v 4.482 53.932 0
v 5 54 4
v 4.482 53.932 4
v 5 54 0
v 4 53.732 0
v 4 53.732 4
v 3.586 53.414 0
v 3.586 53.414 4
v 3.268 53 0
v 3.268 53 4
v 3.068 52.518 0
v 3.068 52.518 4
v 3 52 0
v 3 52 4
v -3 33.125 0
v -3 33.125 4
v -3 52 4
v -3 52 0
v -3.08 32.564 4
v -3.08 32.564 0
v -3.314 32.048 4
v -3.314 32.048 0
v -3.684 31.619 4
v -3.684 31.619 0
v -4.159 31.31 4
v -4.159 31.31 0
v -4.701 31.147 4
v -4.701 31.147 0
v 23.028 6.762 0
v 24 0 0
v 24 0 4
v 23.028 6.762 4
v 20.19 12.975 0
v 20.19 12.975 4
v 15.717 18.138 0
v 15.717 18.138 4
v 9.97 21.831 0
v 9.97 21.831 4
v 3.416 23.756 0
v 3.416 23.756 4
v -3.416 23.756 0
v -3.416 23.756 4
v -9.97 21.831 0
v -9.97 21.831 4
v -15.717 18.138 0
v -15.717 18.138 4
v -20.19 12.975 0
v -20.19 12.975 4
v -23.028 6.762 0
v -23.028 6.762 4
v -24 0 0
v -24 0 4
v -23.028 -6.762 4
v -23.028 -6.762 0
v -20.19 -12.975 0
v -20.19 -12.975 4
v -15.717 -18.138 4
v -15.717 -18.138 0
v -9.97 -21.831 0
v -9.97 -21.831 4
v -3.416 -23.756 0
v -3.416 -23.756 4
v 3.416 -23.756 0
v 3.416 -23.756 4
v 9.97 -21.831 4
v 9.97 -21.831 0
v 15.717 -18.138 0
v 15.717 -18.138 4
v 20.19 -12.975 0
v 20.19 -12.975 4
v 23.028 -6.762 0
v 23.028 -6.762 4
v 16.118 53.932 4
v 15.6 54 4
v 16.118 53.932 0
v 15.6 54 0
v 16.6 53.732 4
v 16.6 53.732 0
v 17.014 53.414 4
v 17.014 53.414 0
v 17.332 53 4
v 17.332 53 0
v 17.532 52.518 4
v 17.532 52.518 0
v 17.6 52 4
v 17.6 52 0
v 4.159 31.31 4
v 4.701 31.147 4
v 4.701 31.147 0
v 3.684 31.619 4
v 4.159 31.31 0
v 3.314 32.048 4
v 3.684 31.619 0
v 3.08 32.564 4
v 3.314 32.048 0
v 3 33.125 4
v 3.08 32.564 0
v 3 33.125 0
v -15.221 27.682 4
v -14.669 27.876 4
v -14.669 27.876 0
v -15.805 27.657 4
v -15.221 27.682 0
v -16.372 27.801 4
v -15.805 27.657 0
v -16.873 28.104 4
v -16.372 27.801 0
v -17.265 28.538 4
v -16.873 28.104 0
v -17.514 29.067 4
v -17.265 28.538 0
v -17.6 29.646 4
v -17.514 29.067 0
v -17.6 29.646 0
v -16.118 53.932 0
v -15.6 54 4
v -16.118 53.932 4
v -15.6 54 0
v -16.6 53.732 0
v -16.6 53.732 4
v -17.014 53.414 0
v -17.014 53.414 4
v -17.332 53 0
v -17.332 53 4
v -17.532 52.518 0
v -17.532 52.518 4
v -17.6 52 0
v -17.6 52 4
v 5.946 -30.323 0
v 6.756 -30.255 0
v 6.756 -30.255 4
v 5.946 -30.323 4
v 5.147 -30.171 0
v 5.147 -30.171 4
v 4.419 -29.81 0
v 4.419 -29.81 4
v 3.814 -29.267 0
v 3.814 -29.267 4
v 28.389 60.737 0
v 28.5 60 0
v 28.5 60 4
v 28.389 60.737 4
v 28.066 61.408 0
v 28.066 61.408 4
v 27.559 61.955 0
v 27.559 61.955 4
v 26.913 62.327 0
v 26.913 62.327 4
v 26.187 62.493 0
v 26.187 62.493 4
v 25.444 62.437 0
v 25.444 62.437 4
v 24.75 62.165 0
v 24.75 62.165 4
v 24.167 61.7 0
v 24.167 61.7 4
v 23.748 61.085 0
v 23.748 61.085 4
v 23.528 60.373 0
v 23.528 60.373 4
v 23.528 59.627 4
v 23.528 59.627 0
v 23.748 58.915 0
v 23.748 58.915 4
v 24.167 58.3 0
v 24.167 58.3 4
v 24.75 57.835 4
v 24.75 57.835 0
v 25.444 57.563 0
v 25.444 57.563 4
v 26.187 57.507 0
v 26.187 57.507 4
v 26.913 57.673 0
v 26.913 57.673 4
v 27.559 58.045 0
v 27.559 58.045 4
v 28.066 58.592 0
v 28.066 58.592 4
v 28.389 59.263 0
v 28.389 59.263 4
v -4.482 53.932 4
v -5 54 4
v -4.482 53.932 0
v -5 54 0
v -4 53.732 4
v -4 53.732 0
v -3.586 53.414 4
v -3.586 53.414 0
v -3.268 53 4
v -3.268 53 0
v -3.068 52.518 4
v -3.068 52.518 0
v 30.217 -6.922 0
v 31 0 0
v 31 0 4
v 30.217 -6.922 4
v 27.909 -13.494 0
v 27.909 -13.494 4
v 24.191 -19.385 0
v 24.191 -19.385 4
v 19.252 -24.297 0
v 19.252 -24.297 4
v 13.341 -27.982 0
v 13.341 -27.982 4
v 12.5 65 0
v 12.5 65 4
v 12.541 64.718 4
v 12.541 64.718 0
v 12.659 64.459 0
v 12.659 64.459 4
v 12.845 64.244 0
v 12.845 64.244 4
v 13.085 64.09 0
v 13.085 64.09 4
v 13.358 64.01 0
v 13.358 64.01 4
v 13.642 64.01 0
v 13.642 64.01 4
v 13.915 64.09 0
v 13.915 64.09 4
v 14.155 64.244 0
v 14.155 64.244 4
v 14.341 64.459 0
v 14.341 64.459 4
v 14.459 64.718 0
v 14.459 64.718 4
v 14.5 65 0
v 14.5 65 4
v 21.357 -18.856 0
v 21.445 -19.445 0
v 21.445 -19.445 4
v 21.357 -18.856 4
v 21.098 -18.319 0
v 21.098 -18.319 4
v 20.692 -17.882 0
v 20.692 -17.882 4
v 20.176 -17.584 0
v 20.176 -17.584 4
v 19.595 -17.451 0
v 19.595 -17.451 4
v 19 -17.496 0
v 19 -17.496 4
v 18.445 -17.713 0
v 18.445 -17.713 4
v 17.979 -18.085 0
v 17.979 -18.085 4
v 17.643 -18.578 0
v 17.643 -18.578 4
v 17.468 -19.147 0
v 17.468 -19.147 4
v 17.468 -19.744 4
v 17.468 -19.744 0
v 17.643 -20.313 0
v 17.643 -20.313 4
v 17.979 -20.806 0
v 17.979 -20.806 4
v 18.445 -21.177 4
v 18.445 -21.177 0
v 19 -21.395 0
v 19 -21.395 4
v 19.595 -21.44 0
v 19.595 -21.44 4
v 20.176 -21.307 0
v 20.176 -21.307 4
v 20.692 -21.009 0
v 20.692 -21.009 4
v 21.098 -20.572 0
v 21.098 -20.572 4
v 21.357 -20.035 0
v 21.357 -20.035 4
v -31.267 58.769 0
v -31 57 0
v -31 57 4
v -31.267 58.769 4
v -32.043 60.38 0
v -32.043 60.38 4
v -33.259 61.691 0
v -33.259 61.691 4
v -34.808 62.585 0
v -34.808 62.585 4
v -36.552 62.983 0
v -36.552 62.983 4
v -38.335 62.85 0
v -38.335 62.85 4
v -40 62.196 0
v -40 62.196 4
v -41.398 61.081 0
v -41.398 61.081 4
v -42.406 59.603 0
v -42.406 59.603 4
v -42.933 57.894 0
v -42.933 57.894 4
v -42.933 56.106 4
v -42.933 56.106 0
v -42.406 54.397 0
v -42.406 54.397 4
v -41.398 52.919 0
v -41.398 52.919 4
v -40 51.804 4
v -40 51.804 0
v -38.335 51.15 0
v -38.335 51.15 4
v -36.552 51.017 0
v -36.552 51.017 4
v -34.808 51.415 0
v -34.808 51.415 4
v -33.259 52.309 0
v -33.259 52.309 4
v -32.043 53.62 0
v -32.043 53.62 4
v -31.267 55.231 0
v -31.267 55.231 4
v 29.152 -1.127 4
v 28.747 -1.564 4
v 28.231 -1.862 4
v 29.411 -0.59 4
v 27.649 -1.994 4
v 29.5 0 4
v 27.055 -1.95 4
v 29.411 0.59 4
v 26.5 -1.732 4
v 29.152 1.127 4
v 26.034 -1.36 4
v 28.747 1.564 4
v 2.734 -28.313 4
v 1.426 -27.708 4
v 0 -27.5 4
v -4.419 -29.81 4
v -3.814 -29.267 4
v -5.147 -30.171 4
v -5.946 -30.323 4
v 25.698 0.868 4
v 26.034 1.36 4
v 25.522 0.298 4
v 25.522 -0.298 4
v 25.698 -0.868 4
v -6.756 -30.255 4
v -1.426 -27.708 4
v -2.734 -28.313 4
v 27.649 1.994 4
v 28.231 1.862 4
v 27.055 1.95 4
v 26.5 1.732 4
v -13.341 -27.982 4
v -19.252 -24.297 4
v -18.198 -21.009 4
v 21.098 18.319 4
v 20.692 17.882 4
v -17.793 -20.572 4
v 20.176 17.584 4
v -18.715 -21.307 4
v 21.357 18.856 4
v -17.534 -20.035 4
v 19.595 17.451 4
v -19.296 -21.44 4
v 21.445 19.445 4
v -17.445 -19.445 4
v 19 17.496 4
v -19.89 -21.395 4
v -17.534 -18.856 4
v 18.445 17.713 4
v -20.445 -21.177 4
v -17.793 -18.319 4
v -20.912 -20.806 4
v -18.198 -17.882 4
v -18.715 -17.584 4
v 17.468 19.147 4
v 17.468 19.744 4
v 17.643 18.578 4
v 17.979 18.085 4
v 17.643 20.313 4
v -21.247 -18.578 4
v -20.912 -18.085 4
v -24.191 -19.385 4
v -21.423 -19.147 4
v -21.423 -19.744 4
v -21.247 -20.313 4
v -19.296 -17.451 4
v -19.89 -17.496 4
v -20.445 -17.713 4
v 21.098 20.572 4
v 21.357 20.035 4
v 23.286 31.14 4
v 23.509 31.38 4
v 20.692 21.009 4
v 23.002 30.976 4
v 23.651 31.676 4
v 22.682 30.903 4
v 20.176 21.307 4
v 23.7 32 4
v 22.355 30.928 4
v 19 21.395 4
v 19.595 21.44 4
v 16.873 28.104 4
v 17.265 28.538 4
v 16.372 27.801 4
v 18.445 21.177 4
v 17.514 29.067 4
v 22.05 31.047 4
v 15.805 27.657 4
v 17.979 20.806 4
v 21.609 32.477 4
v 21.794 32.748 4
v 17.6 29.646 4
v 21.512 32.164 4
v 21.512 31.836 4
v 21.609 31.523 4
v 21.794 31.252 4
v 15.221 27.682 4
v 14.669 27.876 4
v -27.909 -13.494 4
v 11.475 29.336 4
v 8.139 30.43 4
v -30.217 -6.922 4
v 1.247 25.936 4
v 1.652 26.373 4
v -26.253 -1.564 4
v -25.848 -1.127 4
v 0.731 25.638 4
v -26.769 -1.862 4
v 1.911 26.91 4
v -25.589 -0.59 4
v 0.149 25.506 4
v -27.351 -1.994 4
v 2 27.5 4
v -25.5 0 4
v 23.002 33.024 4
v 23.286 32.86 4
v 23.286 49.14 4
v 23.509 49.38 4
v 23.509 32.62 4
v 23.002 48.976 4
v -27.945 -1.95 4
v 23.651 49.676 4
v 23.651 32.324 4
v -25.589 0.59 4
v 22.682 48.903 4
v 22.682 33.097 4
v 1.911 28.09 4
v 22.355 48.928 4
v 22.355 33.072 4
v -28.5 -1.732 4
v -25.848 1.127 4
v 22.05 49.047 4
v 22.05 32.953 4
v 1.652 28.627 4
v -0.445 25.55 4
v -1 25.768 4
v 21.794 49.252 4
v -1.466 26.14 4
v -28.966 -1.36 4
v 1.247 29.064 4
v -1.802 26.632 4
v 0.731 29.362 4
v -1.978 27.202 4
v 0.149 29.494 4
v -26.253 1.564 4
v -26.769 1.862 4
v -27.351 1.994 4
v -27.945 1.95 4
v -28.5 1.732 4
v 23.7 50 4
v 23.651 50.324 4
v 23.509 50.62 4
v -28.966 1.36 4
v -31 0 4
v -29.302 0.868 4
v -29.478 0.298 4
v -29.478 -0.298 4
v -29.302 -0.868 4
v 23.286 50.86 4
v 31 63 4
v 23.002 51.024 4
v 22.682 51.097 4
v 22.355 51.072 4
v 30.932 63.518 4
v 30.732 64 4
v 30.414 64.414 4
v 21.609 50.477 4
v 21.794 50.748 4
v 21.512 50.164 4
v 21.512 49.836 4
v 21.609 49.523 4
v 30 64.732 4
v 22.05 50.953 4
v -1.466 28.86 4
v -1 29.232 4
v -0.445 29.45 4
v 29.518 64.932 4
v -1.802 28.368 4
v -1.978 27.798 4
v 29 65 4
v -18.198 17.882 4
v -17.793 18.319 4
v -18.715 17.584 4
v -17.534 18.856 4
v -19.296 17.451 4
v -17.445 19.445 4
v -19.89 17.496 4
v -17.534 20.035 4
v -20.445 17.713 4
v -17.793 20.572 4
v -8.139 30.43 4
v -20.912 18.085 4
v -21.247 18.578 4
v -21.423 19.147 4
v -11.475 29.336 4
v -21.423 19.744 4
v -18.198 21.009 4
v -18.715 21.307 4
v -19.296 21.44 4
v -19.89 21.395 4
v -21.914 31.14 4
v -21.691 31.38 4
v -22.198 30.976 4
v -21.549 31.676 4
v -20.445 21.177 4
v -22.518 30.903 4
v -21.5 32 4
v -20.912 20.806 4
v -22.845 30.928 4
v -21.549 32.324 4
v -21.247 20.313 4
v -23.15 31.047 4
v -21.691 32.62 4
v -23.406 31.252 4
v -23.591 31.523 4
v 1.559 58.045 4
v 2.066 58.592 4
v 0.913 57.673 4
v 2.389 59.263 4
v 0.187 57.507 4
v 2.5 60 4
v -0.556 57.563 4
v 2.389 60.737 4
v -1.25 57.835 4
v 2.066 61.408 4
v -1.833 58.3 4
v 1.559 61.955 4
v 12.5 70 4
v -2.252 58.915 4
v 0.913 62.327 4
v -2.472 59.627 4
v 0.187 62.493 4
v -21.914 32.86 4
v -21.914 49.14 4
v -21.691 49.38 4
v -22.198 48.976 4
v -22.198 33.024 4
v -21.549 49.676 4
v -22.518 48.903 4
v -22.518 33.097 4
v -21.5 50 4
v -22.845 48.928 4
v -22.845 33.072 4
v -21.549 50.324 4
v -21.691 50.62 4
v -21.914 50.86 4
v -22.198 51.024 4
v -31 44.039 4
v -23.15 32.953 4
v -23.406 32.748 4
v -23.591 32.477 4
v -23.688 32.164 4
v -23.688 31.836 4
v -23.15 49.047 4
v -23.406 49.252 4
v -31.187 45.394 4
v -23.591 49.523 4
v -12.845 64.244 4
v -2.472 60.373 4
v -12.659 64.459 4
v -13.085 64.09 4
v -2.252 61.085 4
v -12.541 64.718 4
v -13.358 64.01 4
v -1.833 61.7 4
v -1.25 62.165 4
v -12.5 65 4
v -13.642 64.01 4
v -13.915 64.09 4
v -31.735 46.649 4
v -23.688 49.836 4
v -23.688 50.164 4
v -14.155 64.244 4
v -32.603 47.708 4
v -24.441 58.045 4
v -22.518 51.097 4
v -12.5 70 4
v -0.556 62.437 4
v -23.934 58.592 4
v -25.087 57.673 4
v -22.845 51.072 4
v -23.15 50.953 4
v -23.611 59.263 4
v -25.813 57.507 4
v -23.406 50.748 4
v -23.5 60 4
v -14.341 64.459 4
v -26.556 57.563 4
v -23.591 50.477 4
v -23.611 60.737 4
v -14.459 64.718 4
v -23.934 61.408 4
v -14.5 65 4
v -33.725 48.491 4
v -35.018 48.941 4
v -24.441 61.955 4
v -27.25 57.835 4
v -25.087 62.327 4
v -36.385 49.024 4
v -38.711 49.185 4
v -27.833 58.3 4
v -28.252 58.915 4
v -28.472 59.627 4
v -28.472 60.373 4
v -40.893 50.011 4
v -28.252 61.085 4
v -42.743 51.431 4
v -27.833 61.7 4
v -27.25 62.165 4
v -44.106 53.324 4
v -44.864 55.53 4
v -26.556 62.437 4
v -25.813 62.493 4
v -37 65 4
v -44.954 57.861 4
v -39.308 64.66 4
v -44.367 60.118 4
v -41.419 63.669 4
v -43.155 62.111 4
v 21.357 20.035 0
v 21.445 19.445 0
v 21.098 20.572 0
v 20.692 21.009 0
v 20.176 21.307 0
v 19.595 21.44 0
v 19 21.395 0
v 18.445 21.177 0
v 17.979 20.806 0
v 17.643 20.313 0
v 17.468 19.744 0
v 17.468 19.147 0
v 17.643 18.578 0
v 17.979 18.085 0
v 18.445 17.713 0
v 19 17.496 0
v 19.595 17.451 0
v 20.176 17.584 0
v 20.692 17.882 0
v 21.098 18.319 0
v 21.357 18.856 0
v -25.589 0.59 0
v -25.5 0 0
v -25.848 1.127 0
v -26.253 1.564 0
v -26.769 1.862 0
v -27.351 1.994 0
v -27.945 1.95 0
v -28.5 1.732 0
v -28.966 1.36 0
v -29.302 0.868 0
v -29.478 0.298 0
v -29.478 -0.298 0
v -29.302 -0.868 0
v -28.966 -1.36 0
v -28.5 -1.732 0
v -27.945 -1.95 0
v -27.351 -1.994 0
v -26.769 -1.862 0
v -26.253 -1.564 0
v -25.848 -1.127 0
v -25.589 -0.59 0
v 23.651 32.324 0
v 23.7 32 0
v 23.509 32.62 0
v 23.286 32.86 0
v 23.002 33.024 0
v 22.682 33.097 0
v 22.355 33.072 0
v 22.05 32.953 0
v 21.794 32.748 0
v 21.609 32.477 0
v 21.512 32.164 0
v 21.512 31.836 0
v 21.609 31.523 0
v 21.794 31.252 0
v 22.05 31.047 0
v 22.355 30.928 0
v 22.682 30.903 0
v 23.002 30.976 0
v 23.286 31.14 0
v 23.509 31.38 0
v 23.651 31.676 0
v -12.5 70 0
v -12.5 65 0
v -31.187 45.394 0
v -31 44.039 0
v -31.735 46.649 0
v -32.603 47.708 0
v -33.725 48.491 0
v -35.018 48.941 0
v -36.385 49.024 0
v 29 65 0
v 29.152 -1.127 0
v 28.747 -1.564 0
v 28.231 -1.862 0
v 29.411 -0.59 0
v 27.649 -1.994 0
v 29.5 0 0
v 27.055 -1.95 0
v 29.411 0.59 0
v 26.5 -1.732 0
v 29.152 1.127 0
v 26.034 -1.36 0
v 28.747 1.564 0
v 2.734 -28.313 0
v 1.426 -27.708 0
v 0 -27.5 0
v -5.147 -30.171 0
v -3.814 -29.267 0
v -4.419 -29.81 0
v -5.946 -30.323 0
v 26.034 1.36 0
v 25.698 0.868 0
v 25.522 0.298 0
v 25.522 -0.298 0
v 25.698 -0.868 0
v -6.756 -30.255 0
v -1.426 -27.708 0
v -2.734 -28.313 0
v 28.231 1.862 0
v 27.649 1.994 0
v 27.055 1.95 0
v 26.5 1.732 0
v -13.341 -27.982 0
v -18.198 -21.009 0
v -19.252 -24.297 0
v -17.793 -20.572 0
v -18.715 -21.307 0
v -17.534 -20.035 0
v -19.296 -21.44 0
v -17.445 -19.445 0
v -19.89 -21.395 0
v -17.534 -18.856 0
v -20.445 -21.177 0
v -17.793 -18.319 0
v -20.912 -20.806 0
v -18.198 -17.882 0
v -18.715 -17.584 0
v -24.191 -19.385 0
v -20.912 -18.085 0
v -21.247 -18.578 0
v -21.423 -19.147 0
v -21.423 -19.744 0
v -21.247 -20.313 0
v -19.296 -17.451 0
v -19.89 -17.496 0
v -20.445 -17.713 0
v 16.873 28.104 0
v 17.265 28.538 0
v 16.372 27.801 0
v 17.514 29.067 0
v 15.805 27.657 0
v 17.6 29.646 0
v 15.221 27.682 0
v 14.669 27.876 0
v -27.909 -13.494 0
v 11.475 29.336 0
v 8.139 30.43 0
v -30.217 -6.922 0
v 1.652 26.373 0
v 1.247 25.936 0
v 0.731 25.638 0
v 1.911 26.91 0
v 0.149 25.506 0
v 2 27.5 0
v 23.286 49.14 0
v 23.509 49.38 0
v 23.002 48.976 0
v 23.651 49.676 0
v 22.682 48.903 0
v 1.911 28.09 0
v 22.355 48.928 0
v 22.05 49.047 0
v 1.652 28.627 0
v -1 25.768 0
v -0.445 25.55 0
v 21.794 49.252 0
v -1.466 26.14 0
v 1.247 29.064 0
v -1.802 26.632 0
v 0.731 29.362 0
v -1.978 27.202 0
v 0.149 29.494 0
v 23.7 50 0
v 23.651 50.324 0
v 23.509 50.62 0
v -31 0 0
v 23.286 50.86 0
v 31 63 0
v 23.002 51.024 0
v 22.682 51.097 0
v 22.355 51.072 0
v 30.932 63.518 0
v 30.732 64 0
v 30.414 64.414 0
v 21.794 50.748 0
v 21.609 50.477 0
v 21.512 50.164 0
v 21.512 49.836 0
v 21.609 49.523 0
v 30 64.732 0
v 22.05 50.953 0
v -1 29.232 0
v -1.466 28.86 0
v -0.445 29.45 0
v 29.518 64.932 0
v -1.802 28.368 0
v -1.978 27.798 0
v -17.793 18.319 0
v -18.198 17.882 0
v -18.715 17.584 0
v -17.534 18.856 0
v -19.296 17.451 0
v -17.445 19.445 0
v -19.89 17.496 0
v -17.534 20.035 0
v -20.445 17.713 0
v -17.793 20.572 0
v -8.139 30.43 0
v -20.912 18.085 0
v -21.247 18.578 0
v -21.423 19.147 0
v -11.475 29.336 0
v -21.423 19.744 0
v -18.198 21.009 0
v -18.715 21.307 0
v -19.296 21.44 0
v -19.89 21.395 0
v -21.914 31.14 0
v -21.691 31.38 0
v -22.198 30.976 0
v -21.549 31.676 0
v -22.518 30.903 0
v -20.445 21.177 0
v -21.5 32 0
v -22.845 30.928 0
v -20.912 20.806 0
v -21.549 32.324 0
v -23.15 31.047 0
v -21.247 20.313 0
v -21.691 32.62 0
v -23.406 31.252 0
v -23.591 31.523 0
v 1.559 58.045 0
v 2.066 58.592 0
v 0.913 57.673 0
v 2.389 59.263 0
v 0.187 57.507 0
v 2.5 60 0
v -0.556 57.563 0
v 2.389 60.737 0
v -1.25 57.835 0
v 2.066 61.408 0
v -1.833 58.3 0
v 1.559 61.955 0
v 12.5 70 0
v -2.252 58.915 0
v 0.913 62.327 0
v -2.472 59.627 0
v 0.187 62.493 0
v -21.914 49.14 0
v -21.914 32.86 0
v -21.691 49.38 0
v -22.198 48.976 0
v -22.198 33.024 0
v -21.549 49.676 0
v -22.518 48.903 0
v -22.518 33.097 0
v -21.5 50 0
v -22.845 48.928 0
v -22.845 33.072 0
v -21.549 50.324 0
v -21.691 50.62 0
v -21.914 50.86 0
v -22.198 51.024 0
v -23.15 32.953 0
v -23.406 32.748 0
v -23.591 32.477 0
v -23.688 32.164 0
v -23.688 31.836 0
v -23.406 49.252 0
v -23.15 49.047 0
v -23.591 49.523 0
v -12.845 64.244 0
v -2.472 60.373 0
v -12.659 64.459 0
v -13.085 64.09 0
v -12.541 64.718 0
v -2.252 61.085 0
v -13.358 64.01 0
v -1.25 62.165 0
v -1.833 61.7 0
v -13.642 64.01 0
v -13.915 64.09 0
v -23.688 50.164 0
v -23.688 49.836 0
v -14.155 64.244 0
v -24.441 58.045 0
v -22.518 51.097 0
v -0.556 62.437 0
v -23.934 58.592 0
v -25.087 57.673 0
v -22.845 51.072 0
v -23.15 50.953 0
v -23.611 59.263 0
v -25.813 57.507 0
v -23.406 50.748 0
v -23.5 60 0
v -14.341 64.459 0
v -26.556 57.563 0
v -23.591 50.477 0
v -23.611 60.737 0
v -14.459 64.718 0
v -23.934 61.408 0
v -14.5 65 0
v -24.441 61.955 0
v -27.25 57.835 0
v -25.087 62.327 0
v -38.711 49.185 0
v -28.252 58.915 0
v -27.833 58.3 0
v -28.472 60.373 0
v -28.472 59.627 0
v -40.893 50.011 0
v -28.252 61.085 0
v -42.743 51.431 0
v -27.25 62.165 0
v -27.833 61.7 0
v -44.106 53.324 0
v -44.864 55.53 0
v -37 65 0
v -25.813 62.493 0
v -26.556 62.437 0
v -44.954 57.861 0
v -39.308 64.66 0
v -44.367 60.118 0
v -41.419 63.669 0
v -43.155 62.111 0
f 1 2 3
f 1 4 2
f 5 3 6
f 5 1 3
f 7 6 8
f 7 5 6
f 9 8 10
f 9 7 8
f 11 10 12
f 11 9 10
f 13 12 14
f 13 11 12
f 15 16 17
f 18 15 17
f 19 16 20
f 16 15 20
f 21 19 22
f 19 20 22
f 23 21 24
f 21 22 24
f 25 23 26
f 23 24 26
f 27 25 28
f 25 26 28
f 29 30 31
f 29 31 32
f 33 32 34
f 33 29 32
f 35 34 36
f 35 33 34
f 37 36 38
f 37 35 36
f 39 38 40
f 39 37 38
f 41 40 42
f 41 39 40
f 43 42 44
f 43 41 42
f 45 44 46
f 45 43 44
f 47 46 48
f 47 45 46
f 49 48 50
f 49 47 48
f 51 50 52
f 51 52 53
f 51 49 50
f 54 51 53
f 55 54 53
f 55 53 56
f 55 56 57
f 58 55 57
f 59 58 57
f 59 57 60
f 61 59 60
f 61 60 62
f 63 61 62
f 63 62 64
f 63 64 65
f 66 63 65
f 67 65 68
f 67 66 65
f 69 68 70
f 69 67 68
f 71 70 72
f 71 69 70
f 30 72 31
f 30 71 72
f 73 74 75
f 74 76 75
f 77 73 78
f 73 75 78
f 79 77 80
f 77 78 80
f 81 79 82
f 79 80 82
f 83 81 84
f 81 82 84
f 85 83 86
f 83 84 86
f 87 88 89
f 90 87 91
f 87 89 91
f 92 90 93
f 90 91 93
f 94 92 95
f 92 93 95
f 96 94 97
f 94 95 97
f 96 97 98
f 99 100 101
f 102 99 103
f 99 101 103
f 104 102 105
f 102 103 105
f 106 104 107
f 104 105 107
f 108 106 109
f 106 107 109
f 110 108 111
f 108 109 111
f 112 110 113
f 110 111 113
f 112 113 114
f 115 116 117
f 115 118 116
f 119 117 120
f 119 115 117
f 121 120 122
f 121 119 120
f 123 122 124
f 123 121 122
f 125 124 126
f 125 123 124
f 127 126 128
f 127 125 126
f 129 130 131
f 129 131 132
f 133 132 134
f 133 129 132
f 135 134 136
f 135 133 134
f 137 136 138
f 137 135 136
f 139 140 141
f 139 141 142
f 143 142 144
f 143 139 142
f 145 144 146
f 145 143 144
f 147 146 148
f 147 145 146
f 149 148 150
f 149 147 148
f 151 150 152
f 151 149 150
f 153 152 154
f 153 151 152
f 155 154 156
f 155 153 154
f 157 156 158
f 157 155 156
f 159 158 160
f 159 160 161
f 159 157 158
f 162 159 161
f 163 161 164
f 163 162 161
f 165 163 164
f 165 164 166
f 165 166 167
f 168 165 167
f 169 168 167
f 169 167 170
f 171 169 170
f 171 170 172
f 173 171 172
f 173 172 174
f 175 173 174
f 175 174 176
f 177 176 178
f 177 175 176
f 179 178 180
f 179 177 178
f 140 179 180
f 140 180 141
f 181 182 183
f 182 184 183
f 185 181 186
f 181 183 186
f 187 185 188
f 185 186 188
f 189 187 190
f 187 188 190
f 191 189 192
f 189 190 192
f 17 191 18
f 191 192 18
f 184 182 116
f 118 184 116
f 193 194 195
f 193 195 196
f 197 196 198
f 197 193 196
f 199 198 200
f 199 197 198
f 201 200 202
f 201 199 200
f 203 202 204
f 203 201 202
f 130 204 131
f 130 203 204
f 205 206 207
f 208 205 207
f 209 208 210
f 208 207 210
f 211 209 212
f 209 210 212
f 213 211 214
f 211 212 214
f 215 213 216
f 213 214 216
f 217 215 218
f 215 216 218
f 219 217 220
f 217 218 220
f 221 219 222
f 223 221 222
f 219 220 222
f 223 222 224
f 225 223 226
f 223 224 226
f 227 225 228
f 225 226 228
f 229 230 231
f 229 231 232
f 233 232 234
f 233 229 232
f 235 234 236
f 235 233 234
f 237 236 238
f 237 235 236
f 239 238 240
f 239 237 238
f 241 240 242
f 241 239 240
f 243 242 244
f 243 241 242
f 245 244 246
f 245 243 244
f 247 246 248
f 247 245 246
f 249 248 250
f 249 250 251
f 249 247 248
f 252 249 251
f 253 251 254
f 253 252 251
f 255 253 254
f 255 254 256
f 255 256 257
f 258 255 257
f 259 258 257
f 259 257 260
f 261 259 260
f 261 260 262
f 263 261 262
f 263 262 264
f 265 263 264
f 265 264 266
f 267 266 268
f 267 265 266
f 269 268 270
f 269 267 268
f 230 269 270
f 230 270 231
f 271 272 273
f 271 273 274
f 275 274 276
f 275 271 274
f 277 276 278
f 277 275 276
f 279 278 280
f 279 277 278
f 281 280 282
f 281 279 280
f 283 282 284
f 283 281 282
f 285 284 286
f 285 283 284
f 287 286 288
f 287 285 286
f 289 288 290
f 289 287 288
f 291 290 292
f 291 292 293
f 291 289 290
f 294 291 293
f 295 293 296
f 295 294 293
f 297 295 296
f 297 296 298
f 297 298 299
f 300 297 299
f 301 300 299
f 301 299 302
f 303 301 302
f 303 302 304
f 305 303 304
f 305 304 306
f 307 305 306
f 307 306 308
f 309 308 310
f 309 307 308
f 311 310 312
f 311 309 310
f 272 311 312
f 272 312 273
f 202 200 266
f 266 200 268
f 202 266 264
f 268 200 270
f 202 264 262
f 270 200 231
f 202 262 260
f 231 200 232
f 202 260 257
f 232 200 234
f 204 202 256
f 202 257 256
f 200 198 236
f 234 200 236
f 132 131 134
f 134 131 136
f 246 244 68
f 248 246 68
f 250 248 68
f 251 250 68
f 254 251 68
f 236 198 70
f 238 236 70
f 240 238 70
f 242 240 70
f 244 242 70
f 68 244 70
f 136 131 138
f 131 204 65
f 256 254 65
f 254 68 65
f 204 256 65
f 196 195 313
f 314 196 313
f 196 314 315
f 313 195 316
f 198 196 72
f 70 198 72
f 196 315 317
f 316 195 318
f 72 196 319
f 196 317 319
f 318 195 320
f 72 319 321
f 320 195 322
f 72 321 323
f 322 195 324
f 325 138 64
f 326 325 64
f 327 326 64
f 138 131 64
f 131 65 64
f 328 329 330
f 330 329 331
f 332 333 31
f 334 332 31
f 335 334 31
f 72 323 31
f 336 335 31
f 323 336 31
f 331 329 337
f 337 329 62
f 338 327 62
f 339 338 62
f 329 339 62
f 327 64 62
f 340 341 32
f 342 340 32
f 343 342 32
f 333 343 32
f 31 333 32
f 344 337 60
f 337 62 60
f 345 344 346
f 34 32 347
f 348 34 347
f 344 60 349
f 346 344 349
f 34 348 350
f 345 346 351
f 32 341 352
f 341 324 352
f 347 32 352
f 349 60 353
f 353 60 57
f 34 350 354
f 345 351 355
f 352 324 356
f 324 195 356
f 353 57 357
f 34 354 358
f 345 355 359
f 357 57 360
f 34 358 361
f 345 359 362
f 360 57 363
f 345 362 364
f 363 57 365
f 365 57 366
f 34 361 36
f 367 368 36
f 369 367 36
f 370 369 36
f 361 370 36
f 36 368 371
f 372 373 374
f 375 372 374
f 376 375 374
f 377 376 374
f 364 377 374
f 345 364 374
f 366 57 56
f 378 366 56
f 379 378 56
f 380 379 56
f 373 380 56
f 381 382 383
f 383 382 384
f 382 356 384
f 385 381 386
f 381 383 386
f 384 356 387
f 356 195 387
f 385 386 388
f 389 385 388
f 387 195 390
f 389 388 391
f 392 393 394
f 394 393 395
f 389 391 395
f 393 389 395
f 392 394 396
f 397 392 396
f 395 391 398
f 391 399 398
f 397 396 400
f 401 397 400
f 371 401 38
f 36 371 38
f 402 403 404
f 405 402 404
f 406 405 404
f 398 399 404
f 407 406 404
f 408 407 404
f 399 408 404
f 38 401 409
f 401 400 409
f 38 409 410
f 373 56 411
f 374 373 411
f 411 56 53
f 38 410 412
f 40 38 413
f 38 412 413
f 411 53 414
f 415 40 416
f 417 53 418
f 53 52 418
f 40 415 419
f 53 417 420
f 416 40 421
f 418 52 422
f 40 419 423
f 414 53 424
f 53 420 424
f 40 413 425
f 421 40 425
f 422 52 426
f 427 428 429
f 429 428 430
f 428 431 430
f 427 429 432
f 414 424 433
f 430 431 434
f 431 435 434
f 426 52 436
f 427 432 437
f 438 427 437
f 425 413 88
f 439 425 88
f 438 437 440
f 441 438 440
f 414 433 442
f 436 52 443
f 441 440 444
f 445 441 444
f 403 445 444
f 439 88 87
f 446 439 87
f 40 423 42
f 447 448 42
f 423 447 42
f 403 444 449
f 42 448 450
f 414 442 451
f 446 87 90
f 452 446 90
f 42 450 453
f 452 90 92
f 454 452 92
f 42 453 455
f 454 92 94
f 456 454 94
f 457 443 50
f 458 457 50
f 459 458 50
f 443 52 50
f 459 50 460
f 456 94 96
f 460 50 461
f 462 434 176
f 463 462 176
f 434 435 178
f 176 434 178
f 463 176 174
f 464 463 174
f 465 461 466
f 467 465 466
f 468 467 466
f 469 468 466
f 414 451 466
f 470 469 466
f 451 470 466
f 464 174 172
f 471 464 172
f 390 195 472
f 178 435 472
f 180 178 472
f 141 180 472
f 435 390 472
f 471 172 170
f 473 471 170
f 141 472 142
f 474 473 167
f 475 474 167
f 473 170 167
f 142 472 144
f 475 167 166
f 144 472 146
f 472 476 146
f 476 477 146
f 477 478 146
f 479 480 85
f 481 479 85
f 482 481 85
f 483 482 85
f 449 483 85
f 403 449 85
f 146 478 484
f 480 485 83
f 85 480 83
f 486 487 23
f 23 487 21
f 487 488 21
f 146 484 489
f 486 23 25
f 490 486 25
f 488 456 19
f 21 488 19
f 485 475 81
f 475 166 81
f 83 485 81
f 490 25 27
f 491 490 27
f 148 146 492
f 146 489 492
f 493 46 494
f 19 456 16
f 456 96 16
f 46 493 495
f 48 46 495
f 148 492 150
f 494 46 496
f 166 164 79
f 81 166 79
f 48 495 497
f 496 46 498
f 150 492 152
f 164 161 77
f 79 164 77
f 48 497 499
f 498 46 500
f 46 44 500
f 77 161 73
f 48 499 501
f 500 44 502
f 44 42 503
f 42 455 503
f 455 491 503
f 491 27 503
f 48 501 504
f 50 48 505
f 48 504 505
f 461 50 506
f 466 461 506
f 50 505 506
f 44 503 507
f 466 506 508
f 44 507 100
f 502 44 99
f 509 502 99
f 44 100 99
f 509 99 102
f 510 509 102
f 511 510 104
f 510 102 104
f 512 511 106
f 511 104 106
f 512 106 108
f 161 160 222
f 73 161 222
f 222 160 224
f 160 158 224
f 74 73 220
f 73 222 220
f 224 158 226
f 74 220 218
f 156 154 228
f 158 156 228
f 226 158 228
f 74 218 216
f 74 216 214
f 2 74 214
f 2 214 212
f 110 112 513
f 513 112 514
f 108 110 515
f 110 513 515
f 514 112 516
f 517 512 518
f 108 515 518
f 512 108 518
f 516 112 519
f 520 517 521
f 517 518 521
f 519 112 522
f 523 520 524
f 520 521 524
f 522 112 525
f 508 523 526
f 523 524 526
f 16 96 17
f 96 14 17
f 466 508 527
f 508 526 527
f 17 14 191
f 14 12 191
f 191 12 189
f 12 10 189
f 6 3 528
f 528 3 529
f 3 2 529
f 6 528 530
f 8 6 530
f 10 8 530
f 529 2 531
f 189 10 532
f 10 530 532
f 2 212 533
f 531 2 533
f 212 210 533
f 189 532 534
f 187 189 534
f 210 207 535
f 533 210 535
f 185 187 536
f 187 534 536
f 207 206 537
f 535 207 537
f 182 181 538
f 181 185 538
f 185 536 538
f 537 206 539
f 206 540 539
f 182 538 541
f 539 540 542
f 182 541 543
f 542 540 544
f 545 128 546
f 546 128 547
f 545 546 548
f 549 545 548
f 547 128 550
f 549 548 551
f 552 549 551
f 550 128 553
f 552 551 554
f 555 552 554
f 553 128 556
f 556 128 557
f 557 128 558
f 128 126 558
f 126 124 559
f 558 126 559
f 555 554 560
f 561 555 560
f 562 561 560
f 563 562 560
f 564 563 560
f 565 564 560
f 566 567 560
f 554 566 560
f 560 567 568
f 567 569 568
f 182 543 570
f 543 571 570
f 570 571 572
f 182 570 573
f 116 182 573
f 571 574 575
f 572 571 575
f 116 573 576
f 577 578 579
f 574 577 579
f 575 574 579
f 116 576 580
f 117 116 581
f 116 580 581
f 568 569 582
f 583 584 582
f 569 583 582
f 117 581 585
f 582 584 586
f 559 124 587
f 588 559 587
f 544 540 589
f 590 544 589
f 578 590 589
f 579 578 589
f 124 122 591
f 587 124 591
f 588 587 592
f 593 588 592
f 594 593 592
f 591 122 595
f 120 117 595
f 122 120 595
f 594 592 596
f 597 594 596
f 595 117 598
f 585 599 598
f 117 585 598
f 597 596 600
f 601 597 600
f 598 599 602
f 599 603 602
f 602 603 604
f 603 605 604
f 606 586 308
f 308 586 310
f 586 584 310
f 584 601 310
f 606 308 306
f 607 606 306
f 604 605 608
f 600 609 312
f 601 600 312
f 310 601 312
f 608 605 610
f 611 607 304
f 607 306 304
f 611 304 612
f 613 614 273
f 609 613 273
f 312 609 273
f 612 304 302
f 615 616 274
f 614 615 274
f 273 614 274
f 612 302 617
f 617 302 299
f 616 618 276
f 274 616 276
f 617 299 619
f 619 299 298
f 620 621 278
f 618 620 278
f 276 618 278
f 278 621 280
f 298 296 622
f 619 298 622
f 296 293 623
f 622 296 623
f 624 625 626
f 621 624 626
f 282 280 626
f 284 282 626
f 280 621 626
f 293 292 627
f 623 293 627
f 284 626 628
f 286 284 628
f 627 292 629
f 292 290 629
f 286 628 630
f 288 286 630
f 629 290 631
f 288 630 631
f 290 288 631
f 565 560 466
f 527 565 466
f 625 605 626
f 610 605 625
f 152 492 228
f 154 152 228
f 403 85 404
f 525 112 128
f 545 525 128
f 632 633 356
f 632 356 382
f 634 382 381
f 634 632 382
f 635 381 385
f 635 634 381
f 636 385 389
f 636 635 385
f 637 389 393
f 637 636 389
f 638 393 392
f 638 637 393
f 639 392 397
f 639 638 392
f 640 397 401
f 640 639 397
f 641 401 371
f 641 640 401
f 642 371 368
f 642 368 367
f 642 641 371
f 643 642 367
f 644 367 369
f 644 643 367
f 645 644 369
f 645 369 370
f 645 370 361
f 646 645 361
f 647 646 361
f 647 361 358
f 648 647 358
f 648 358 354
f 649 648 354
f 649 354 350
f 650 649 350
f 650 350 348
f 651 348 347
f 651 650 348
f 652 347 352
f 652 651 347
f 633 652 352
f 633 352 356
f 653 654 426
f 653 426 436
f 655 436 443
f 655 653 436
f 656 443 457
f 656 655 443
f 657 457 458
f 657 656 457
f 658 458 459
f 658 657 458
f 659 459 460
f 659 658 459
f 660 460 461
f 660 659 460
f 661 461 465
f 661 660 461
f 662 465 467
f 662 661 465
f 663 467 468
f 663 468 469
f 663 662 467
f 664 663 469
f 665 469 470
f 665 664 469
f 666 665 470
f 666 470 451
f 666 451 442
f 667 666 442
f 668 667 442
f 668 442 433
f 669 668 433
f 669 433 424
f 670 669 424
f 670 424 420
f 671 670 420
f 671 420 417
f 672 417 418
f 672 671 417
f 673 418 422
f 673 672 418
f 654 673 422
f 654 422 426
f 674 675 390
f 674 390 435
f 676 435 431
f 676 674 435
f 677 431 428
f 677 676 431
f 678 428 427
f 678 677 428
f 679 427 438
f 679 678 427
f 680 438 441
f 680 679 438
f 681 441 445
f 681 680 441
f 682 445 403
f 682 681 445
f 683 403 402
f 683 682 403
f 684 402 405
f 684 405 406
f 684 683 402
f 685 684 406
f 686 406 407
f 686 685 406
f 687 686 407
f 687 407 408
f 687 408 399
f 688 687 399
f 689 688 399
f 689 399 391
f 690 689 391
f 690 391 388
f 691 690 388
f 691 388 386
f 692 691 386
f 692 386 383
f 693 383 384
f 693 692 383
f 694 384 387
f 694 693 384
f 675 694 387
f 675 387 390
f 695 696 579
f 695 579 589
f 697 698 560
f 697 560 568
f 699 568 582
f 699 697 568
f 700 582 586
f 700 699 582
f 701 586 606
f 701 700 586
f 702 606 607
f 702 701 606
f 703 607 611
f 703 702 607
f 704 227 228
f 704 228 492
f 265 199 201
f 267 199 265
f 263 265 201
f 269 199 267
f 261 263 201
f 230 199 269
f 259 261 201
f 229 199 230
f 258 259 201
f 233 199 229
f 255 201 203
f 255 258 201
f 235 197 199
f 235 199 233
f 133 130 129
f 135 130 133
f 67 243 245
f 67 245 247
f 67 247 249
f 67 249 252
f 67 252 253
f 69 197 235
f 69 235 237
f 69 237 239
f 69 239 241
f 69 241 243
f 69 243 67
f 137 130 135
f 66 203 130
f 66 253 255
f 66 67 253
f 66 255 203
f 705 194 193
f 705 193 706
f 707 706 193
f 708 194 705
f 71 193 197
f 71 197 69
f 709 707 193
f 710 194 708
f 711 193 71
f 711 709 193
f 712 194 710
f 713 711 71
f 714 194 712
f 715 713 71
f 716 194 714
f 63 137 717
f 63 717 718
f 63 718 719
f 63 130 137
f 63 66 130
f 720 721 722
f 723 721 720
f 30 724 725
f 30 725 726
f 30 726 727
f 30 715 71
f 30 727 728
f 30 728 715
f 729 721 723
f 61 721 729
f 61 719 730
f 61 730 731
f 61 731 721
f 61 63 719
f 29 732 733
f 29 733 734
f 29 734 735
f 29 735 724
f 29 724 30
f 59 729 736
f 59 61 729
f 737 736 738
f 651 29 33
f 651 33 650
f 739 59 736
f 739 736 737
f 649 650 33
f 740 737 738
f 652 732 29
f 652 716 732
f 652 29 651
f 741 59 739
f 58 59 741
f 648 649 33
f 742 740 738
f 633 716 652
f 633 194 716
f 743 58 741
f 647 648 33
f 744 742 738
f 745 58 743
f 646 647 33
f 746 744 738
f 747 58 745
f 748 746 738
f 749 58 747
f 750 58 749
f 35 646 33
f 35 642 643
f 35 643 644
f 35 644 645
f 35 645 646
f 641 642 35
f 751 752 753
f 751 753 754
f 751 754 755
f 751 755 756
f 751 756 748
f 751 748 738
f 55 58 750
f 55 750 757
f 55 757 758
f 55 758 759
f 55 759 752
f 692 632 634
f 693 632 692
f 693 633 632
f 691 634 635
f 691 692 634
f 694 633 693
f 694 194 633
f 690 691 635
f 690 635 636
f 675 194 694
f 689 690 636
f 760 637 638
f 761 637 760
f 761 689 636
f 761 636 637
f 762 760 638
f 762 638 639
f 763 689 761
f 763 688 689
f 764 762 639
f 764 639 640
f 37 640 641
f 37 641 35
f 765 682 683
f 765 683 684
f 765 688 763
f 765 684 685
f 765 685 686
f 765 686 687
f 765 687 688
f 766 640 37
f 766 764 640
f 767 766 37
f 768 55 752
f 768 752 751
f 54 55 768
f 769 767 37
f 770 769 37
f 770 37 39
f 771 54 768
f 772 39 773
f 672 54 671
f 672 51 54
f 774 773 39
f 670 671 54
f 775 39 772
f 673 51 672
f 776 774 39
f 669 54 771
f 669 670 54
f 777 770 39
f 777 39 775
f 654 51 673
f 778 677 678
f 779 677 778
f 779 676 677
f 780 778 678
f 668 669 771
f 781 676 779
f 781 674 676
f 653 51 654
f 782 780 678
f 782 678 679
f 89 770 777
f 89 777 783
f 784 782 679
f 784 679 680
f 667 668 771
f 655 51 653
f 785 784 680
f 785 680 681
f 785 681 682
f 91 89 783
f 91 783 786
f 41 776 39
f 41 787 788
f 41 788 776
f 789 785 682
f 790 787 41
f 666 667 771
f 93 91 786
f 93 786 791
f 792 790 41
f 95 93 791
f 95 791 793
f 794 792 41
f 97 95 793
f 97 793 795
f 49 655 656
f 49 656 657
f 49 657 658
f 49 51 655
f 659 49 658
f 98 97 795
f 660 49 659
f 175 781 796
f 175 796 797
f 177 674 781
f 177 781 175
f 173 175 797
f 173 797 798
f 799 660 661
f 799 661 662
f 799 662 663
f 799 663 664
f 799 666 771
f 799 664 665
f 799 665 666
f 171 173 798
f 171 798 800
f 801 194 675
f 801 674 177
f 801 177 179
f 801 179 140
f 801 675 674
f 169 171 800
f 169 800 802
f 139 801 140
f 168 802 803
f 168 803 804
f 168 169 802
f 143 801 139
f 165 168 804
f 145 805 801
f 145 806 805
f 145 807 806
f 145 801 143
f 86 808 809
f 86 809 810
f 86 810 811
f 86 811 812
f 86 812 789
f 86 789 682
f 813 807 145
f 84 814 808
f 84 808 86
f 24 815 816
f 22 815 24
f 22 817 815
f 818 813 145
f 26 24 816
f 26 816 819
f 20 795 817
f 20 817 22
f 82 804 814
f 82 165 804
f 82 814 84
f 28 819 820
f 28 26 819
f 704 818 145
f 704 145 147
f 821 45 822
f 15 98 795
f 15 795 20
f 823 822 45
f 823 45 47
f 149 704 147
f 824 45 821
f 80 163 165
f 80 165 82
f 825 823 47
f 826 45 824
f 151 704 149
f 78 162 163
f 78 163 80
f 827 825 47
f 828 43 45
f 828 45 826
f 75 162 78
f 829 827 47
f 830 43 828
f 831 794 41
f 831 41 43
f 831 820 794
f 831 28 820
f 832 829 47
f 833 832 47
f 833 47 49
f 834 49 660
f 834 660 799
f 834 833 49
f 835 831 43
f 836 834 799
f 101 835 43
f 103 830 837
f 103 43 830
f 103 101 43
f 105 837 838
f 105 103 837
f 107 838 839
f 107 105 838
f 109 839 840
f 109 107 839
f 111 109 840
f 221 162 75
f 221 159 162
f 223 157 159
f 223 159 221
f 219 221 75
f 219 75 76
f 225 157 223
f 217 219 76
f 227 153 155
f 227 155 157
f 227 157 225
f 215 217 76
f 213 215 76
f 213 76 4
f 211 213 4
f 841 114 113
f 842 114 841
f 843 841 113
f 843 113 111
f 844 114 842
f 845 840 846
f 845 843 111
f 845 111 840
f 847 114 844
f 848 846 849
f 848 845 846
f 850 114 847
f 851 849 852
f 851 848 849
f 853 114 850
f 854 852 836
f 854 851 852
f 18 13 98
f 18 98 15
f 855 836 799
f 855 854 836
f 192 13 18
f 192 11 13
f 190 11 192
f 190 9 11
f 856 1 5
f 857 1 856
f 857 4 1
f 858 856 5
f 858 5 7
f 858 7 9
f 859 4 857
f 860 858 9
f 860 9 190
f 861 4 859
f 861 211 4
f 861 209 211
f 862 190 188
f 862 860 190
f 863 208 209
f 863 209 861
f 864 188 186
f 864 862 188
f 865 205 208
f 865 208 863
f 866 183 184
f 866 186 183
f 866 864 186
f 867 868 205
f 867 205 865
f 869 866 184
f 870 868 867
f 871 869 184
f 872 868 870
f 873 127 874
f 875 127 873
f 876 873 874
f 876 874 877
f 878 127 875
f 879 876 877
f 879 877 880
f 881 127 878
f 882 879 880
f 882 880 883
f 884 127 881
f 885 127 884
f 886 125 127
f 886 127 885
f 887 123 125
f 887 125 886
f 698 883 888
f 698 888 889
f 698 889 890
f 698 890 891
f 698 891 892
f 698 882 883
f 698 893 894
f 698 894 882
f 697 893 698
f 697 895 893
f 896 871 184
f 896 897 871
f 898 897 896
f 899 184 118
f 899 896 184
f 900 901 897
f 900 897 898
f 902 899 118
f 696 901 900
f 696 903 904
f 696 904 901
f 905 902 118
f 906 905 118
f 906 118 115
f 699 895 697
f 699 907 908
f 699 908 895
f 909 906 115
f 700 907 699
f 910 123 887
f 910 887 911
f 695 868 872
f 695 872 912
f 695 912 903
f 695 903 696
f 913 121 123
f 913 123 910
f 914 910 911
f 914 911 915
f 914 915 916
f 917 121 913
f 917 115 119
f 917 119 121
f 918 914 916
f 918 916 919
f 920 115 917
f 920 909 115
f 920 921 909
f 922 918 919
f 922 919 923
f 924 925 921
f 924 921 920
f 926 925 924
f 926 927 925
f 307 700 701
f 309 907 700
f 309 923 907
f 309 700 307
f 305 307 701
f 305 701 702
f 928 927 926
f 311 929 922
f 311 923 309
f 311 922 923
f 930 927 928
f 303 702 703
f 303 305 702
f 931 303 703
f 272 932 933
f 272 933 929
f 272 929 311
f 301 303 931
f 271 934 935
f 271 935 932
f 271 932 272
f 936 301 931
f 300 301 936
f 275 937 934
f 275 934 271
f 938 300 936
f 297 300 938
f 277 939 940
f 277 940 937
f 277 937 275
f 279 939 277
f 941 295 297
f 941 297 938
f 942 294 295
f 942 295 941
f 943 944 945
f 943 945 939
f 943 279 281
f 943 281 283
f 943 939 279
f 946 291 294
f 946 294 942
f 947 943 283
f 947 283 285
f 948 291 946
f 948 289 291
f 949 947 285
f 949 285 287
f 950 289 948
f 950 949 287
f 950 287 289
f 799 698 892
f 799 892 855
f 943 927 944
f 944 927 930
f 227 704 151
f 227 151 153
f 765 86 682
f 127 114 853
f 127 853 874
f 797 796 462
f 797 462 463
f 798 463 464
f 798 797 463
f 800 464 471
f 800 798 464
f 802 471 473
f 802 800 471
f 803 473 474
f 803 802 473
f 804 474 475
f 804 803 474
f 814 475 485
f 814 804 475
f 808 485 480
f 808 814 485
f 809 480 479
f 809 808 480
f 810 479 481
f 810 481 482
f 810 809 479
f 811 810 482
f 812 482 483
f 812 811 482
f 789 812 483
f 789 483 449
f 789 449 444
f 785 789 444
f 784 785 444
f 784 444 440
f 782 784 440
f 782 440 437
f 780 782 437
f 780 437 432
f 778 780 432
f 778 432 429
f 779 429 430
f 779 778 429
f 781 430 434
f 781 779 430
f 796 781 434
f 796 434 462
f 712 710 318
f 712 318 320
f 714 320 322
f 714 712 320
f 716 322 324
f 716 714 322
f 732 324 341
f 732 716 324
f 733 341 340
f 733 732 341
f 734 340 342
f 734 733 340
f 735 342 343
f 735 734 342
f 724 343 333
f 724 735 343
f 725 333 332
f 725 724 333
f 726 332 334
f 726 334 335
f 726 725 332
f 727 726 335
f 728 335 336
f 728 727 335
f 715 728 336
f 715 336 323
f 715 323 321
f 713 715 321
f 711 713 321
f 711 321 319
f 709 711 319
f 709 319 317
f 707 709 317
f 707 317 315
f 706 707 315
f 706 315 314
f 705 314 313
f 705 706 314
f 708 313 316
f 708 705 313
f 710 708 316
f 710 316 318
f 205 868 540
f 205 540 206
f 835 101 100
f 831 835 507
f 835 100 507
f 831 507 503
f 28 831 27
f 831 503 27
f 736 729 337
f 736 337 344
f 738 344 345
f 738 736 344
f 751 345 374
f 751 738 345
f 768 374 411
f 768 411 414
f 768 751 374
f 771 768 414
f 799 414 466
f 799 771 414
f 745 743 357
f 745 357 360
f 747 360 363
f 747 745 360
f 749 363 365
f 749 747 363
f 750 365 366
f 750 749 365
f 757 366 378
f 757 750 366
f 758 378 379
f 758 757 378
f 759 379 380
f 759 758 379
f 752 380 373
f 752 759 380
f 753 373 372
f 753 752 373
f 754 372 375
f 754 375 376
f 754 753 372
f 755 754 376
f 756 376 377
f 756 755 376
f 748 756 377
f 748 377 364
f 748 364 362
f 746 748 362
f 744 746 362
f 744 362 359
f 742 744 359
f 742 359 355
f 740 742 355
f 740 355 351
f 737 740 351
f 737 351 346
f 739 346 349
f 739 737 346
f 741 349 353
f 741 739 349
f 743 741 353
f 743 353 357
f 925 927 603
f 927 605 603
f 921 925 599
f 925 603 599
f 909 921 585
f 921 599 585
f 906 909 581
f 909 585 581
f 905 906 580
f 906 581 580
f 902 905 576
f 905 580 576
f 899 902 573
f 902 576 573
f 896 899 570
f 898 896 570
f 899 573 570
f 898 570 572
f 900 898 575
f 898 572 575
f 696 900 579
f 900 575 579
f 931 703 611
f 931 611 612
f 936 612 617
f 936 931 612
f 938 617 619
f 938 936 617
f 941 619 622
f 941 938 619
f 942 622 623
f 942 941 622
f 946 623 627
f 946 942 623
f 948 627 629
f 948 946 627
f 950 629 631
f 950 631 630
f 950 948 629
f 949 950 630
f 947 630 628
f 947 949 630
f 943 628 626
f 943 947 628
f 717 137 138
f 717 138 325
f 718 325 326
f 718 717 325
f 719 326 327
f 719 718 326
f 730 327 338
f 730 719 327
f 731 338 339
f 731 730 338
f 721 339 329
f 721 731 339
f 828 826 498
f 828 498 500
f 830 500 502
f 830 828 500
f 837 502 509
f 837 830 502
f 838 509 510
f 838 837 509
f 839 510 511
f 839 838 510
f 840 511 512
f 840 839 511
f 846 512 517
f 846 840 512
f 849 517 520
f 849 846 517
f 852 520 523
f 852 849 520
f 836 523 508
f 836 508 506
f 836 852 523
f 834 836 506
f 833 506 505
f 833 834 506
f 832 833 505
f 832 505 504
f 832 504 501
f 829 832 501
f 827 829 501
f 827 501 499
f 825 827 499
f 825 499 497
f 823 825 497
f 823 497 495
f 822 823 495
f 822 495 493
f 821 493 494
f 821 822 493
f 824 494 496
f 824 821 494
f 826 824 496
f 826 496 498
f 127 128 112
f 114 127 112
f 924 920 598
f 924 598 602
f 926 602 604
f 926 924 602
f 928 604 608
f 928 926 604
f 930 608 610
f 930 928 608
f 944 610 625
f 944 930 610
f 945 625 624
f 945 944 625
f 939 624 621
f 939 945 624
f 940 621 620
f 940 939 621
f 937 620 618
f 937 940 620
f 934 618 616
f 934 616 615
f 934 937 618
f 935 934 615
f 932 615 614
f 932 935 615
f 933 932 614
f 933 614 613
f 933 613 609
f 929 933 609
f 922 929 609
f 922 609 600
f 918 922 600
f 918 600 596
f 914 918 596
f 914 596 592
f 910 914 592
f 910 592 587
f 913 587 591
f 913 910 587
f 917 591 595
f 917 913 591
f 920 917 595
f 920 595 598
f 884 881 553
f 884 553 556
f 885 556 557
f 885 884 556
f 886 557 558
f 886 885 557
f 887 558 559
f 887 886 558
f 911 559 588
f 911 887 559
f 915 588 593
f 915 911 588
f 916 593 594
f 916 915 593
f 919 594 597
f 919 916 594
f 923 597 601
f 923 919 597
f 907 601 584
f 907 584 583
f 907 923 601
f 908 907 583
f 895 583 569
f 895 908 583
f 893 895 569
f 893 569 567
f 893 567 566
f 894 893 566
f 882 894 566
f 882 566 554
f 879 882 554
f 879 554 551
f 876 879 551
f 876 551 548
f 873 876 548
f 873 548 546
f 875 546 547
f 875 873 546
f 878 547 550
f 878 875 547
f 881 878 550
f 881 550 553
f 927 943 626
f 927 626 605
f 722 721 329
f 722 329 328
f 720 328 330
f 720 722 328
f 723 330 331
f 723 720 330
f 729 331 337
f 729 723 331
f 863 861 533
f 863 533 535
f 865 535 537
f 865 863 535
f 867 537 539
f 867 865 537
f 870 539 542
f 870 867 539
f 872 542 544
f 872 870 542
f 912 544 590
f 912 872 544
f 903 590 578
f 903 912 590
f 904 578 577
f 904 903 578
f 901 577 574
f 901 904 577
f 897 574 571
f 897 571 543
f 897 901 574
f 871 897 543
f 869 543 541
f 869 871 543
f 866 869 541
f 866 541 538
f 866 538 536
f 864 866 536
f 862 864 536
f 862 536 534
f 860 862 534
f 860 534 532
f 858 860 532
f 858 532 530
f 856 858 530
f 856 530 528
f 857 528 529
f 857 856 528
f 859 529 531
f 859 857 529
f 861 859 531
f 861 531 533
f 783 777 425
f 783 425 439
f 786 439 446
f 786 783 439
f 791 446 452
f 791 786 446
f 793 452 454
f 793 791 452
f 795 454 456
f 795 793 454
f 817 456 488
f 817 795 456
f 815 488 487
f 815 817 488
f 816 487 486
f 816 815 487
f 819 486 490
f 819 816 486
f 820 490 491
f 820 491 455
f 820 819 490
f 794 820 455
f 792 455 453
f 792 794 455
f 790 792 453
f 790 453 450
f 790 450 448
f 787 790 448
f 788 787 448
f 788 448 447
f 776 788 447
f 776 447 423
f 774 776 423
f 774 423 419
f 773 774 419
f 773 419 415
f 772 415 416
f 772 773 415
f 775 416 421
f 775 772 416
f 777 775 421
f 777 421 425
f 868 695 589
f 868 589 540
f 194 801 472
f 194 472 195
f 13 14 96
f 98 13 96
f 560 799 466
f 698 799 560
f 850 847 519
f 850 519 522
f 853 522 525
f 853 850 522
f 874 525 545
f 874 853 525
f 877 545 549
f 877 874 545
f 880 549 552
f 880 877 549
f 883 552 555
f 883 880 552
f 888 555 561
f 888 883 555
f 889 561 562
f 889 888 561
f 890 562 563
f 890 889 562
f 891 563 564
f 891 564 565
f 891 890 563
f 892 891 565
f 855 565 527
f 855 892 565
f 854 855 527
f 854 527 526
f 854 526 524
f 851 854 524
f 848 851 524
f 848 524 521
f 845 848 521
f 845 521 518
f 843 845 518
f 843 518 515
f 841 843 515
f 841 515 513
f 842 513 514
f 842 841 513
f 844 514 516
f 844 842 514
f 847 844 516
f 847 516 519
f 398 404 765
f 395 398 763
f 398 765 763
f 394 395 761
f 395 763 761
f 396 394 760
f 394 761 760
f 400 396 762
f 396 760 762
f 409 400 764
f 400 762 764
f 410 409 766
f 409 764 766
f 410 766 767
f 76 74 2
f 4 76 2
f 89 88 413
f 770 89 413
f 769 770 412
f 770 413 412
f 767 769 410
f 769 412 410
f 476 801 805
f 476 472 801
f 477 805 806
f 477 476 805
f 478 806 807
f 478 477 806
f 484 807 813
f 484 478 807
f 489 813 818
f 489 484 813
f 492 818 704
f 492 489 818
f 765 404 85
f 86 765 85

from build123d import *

# Parameters (mm, degrees)
SKETCH_1_R          = 24
SKETCH_1_R_2        = 2
SKETCH_1_R_3        = 2.5
SKETCH_1_R_4        = 1.1
SKETCH_1_R_5        = 6
EXTRUDE_1_DEPTH     = 4
SKETCH_2_R          = 1
CUT_EXTRUDE_1_DEPTH = 84.312664103
CUT_EXTRUDE_2_DEPTH = 10
FILLET_2_R          = 2
FILLET_3_R          = 2


with BuildPart() as part:
    # 草图1 → 凸台-拉伸1 (new body)
    with BuildSketch(Plane.XY):
        with BuildLine():
            Line((-31, 0), (-31, 44.038518603))
            ThreePointArc((-31, 44.038518603), (-32.603168898, 47.707515532), (-36.384615385, 49.023703756))
            ThreePointArc((-36.384615385, 49.023703756), (-44.994071865, 56.692079518), (-37, 65))
            Line((-37, 65), (-12.5, 65))
            Line((-12.5, 65), (-12.5, 70))
            Line((-12.5, 70), (12.5, 70))
            Line((12.5, 70), (12.5, 65))
            Line((12.5, 65), (31, 65))
            Line((31, 65), (31, 0))
            ThreePointArc((31, 0), (24.191352338, -19.385006373), (6.756227609, -30.254807692))
            ThreePointArc((6.756227609, -30.254807692), (5.147421514, -30.170867126), (3.813999457, -29.266826923))
            ThreePointArc((3.813999457, -29.266826923), (0, -27.5), (-3.813999457, -29.266826923))
            ThreePointArc((-3.813999457, -29.266826923), (-5.147421514, -30.170867126), (-6.756227609, -30.254807692))
            ThreePointArc((-6.756227609, -30.254807692), (-24.191352338, -19.385006373), (-31, 0))
        make_face()
        Circle(SKETCH_1_R, mode=Mode.SUBTRACT)
        with Locations((-19.445436483, 19.445436483)):
            Circle(SKETCH_1_R_2, mode=Mode.SUBTRACT)
        with Locations((0, 27.5)):
            Circle(SKETCH_1_R_2, mode=Mode.SUBTRACT)
        with Locations((19.445436483, 19.445436483)):
            Circle(SKETCH_1_R_2, mode=Mode.SUBTRACT)
        with Locations((27.5, 0)):
            Circle(SKETCH_1_R_2, mode=Mode.SUBTRACT)
        with Locations((19.445436483, -19.445436483)):
            Circle(SKETCH_1_R_2, mode=Mode.SUBTRACT)
        with Locations((-19.445436483, -19.445436483)):
            Circle(SKETCH_1_R_2, mode=Mode.SUBTRACT)
        with Locations((-27.5, 0)):
            Circle(SKETCH_1_R_2, mode=Mode.SUBTRACT)
        with Locations((-26, 60)):
            Circle(SKETCH_1_R_3, mode=Mode.SUBTRACT)
        with Locations((0, 60)):
            Circle(SKETCH_1_R_3, mode=Mode.SUBTRACT)
        with Locations((26, 60)):
            Circle(SKETCH_1_R_3, mode=Mode.SUBTRACT)
        with Locations((-22.6, 50)):
            Circle(SKETCH_1_R_4, mode=Mode.SUBTRACT)
        with Locations((-22.6, 32)):
            Circle(SKETCH_1_R_4, mode=Mode.SUBTRACT)
        with Locations((22.6, 32)):
            Circle(SKETCH_1_R_4, mode=Mode.SUBTRACT)
        with Locations((22.6, 50)):
            Circle(SKETCH_1_R_4, mode=Mode.SUBTRACT)
        with Locations((-37, 57)):
            Circle(SKETCH_1_R_5, mode=Mode.SUBTRACT)
    extrude(amount=EXTRUDE_1_DEPTH)

    # 草图2 → 切除-拉伸1 (cut, through all)
    with BuildSketch(Plane.XY.offset(4)):
        with Locations((-13.5, 65)):
            Circle(SKETCH_2_R)
        with Locations((13.5, 65)):
            Circle(SKETCH_2_R)
    extrude(amount=-CUT_EXTRUDE_1_DEPTH, mode=Mode.SUBTRACT)

    # 草图3 → 切除-拉伸2 (cut)
    with BuildSketch(Plane.XY.offset(4)):
        with BuildLine():
            Line((-3, 54), (-17.6, 54))
            Line((-17.6, 54), (-17.6, 26.124509565))
            ThreePointArc((-17.6, 26.124509565), (-10.627053281, 29.653258482), (-3, 31.356817441))
            Line((-3, 31.356817441), (-3, 54))
        make_face()
        with BuildLine():
            Line((17.6, 54), (3, 54))
            Line((3, 54), (3, 31.356817441))
            ThreePointArc((3, 31.356817441), (10.627053281, 29.653258482), (17.6, 26.124509565))
            Line((17.6, 26.124509565), (17.6, 54))
        make_face()
    extrude(amount=-CUT_EXTRUDE_2_DEPTH, mode=Mode.SUBTRACT)

    # 圆角2
    fillet_2_edges = [part.edges().sort_by_distance(p)[0] for p in [
        (-3, 31.356817441, 2),
        (-17.6, 26.124509565, 2),
        (-17.6, 54, 2),
        (-3, 54, 2),
        (17.6, 26.124509565, 2),
        (3, 31.356817441, 2),
        (3, 54, 2),
        (17.6, 54, 2),
    ]]
    fillet(fillet_2_edges, radius=FILLET_2_R)

    # 圆角3
    fillet_3_edges = [part.edges().sort_by_distance(p)[0] for p in [
        (31, 65, 2),
    ]]
    fillet(fillet_3_edges, radius=FILLET_3_R)


solid = part.part
